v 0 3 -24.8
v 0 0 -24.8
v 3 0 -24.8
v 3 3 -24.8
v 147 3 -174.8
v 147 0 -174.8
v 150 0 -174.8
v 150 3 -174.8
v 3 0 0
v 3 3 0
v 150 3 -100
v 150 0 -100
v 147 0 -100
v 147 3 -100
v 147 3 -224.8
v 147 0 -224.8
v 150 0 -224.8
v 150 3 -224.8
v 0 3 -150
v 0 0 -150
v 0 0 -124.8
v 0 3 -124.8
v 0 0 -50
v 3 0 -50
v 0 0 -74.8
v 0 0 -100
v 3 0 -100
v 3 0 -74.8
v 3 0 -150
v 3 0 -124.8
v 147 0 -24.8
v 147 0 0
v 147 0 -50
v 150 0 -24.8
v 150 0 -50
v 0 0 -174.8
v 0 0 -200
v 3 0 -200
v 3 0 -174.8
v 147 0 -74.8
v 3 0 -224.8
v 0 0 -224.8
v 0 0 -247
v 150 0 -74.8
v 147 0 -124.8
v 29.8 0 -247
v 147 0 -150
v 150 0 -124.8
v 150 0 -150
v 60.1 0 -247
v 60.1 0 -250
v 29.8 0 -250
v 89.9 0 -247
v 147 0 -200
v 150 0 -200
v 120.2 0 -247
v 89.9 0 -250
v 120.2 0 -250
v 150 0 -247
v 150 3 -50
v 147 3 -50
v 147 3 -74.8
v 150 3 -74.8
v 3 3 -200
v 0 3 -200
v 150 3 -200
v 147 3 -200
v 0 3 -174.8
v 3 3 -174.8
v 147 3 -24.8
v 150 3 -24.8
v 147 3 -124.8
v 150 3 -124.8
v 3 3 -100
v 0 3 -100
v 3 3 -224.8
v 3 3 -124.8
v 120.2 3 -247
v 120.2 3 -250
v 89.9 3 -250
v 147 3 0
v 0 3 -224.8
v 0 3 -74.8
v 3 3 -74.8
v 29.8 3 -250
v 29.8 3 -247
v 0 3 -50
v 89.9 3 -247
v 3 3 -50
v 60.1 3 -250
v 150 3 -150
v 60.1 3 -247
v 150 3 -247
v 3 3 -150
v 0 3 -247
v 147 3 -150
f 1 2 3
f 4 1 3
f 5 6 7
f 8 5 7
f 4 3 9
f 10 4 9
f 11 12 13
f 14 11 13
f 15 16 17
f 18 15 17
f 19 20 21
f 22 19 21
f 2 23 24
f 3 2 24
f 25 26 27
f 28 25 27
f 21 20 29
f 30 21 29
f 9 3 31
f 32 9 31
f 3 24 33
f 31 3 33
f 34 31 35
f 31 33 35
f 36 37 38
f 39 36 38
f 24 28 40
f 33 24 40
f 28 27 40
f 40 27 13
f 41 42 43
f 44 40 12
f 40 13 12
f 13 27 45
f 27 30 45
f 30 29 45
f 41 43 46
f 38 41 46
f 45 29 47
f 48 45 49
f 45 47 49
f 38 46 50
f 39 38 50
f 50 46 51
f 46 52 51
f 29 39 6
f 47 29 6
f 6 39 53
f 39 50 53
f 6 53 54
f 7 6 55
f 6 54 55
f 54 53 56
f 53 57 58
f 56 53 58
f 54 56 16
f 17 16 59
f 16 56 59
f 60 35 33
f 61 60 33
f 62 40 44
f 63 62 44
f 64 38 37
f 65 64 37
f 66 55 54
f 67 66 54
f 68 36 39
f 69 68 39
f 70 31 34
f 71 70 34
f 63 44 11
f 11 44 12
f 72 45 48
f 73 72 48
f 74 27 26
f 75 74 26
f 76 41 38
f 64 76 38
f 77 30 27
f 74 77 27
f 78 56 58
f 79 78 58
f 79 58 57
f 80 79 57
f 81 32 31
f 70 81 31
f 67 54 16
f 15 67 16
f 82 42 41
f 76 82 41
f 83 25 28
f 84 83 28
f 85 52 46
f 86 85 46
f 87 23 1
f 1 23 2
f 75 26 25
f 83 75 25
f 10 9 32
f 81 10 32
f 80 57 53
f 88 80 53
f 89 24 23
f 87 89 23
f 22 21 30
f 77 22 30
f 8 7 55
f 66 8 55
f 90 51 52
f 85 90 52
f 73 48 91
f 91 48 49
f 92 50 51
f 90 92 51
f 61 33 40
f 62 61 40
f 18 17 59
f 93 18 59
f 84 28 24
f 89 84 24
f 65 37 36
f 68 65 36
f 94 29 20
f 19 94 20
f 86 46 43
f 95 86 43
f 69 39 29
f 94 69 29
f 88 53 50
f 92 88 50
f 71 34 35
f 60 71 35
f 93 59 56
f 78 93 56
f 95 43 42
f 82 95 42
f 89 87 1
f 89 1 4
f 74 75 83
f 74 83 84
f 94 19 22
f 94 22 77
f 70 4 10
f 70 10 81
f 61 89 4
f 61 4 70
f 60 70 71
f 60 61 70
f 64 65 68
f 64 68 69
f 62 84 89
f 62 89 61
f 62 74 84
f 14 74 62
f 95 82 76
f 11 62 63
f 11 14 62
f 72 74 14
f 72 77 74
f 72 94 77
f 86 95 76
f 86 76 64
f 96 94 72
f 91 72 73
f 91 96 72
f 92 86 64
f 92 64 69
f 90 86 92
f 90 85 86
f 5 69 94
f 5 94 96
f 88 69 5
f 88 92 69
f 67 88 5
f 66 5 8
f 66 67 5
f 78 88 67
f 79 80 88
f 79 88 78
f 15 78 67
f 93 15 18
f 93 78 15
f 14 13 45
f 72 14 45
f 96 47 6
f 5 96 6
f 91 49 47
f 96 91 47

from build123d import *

# Parameters (mm, degrees)
BOSS_EXTRUDE1_DEPTH = 3


with BuildPart() as part:
    # Sketch1 → Boss-Extrude1 (new body)
    with BuildSketch(Plane(origin=(0, 0, 0), x_dir=(1, 0, 0), z_dir=(0, 1, 0))):
        Polygon((3, 24.8), (3, 0), (147, 0), (147, 24.8), (150, 24.8), (150, 50), (147, 50), (147, 74.8), (150, 74.8), (150, 100), (147, 100), (147, 124.8), (150, 124.8), (150, 150), (147, 150), (147, 174.8), (150, 174.8), (150, 200), (147, 200), (147, 224.8), (150, 224.8), (150, 247), (120.2, 247), (120.2, 250), (89.9, 250), (89.9, 247), (60.1, 247), (60.1, 250), (29.8, 250), (29.8, 247), (0, 247), (0, 224.8), (3, 224.8), (3, 200), (0, 200), (0, 174.8), (3, 174.8), (3, 150), (0, 150), (0, 124.8), (3, 124.8), (3, 100), (0, 100), (0, 74.8), (3, 74.8), (3, 50), (0, 50), (0, 24.8), align=None)
    extrude(amount=BOSS_EXTRUDE1_DEPTH)


solid = part.part
